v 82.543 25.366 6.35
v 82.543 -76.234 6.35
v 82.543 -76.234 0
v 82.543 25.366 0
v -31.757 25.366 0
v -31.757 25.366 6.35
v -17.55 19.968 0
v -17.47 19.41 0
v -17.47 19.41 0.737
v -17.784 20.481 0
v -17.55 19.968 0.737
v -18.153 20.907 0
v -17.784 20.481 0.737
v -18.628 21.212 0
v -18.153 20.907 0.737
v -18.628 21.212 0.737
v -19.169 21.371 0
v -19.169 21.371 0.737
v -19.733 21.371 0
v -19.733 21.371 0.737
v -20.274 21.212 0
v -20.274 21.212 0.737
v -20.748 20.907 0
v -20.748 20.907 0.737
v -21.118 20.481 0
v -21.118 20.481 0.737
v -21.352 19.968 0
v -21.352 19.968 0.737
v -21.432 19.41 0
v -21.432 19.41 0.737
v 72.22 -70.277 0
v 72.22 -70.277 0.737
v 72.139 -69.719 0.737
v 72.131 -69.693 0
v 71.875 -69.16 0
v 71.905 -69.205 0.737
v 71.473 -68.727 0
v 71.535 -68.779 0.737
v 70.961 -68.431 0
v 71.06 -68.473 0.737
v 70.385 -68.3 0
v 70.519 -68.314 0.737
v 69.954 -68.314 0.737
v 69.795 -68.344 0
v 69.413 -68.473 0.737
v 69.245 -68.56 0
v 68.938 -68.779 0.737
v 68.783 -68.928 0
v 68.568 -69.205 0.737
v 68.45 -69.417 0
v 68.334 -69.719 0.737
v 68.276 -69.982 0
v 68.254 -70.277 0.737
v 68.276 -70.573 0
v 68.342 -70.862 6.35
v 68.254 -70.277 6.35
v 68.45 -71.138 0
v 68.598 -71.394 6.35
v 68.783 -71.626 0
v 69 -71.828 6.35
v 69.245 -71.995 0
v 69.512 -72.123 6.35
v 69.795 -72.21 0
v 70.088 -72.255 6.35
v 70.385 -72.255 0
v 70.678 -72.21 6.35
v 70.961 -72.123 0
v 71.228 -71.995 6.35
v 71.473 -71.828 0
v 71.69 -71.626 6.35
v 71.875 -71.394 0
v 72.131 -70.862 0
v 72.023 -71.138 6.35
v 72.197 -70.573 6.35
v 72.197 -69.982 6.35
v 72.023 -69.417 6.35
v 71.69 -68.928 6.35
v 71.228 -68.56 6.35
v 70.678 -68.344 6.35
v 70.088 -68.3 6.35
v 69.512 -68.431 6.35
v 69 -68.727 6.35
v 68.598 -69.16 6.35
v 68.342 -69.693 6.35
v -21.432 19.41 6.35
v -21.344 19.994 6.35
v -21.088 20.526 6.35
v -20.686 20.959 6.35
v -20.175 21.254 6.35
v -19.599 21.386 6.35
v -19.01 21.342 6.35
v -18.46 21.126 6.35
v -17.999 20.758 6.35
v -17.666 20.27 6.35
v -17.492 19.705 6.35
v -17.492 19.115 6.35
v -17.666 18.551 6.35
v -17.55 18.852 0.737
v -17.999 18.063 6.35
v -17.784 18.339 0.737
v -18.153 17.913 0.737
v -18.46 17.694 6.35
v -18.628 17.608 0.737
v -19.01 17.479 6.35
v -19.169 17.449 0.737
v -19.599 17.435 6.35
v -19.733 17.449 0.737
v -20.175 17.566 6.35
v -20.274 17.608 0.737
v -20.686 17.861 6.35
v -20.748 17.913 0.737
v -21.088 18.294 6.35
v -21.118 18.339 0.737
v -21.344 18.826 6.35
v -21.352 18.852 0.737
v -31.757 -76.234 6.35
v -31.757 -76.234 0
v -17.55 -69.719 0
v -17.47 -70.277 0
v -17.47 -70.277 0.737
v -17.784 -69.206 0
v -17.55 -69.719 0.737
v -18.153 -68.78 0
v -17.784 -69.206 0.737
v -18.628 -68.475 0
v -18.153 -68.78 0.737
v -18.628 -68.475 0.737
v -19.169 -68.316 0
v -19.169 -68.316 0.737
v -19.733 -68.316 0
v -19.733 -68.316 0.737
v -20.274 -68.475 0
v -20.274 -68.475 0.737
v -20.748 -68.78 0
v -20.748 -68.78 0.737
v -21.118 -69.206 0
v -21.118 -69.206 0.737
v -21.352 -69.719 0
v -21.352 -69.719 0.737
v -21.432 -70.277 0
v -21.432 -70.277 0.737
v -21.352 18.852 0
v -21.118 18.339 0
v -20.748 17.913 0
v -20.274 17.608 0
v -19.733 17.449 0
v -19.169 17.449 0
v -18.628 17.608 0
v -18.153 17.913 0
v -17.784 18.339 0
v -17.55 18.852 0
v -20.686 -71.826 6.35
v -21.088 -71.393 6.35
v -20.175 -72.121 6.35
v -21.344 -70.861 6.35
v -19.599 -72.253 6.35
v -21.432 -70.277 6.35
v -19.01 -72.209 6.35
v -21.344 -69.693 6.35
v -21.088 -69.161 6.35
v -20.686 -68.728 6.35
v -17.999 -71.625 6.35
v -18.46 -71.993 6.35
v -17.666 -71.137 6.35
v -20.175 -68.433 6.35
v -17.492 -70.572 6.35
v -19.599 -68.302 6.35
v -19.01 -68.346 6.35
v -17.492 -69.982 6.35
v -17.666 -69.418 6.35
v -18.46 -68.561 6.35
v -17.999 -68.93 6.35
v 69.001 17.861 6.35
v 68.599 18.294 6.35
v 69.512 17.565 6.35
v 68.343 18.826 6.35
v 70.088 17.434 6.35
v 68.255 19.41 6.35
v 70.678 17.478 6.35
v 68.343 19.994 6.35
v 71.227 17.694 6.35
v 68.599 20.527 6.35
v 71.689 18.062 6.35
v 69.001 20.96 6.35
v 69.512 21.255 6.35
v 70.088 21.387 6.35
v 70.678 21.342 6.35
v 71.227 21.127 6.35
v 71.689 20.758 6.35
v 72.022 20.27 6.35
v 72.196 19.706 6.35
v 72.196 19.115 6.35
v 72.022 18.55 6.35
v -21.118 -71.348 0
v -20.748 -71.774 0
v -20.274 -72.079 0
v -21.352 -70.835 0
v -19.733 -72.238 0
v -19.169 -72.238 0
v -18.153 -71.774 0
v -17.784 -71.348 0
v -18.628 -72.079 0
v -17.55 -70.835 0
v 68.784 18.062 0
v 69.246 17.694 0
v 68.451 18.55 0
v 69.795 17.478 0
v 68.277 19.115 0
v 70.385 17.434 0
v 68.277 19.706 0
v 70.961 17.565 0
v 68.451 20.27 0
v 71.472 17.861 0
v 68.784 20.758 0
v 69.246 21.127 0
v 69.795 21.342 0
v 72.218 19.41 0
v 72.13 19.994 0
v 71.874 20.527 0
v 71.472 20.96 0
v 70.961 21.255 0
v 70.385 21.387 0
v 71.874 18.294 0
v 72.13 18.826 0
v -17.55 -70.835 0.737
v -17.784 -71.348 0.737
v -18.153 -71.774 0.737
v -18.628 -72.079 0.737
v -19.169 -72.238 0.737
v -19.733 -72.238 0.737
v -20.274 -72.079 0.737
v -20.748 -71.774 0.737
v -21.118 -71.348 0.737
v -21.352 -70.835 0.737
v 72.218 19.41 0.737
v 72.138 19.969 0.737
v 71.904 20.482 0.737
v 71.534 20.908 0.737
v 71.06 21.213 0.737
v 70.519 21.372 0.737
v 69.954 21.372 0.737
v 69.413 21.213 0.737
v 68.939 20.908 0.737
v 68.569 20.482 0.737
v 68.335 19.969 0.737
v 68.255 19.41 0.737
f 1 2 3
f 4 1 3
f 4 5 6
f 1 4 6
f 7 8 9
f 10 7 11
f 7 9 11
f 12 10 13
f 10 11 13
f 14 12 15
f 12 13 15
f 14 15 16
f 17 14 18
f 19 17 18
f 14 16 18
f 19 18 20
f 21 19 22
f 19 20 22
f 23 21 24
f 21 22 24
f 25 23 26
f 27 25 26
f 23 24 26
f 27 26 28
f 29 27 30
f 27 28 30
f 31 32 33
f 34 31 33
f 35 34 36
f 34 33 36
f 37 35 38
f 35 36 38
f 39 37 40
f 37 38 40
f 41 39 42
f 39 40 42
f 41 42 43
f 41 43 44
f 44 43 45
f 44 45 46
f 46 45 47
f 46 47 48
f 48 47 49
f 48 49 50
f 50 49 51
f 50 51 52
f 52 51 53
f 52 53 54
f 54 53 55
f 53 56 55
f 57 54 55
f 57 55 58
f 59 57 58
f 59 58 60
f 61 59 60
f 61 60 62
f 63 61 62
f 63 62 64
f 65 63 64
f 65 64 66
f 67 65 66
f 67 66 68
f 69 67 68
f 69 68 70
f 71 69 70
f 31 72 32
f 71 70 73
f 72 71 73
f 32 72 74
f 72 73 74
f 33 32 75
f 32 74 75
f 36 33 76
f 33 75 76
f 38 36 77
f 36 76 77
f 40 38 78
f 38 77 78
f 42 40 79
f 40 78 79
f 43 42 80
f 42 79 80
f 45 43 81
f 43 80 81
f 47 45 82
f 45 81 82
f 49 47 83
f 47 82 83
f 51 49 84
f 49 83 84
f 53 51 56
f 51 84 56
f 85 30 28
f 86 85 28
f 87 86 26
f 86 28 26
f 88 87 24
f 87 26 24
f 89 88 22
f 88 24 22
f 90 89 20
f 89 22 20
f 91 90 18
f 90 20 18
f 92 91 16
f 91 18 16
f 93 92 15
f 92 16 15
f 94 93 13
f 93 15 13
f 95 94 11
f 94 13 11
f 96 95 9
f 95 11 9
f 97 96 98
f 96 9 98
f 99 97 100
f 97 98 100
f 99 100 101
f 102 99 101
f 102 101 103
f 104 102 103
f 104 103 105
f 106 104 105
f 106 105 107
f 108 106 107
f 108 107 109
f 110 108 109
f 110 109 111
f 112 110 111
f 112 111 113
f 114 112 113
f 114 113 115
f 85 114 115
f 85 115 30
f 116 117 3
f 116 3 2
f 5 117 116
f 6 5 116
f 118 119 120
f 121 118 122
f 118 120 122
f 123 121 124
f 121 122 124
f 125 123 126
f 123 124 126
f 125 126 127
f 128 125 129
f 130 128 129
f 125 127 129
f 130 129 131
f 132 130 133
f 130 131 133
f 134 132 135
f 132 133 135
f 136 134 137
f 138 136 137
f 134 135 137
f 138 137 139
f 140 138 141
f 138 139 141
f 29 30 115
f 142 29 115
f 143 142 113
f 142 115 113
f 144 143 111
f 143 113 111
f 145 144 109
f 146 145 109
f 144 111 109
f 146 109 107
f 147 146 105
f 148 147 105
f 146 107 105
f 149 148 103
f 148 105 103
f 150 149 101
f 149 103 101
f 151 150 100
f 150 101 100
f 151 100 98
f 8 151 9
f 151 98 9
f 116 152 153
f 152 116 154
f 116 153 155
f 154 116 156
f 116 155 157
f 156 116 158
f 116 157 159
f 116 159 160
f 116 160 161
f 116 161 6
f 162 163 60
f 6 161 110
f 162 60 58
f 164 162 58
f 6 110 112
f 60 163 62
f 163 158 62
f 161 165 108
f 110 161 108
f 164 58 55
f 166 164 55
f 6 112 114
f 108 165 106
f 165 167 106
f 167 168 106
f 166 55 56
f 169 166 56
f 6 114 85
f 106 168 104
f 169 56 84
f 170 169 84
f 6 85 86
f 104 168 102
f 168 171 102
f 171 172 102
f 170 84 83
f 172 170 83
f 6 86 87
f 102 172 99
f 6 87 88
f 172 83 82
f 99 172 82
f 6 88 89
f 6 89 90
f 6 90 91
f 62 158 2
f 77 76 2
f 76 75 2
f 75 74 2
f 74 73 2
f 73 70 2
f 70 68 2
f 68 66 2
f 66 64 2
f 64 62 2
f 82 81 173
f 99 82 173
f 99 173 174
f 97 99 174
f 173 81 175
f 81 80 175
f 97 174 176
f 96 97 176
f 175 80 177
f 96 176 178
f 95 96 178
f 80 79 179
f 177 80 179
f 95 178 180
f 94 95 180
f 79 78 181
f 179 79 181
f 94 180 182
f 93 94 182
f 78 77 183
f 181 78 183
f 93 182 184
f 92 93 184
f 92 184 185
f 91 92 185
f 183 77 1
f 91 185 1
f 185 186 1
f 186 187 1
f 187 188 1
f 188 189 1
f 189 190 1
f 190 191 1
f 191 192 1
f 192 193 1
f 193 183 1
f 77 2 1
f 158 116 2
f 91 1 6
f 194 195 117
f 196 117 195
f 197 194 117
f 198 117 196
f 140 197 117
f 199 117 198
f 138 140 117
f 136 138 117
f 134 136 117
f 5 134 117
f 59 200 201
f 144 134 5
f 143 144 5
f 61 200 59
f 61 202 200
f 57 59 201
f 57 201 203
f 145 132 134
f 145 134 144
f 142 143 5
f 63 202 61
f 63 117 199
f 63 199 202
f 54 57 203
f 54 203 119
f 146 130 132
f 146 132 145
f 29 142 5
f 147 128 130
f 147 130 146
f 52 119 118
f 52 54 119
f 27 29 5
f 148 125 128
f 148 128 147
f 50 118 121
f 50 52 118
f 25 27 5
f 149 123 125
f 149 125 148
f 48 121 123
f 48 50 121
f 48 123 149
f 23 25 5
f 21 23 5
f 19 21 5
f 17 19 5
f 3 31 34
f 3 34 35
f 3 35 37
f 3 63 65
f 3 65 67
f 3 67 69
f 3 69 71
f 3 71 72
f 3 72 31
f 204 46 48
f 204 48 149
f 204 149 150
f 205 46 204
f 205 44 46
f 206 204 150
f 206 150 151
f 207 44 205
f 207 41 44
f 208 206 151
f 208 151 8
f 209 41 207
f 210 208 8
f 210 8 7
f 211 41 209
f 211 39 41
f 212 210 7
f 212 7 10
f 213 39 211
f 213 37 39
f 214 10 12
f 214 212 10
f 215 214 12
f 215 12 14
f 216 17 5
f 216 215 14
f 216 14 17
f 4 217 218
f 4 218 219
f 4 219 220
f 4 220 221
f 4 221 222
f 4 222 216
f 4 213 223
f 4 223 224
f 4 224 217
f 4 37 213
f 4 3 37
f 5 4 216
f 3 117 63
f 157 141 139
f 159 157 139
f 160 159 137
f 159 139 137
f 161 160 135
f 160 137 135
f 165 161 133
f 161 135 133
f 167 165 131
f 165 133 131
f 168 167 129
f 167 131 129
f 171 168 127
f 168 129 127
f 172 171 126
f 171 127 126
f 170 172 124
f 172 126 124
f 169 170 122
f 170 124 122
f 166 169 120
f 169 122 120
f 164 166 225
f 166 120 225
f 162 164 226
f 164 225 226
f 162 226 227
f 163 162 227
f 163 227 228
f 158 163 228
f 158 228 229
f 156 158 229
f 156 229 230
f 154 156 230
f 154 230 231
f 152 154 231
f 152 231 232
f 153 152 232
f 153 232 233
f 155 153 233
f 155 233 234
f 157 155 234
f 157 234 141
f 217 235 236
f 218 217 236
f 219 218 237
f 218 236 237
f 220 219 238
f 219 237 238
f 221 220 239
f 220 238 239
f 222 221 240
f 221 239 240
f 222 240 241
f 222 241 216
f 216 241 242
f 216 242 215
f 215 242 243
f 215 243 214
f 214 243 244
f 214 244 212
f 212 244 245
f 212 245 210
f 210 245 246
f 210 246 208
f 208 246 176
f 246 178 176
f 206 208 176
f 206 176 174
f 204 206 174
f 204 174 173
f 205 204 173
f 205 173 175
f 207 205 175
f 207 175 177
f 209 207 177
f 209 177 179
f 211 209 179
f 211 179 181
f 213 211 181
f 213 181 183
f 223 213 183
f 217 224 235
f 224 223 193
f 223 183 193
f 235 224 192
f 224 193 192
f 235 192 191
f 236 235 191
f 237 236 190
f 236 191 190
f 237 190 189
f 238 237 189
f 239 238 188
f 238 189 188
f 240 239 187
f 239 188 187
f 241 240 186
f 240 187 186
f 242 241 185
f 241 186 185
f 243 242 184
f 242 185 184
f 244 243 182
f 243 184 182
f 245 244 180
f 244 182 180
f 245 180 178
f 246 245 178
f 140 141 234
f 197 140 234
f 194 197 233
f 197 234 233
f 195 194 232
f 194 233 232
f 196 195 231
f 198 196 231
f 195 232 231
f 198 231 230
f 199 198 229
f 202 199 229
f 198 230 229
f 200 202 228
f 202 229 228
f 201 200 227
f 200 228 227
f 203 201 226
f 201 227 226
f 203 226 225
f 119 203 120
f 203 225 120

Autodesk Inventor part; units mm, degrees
ref_plane "YZ Plane" through (0, 0, 0) normal (1, 0, 0) x (0, 1, 0)
ref_plane "XZ Plane" through (0, 0, 0) normal (0, 1, 0) x (-1, 0, 0)
ref_plane "XY Plane" through (0, 0, 0) normal (0, 0, 1) x (1, 0, 0)
sketch "Sketch1" plane through (0, 0, 0) normal (0, 0, 1) x (1, 0, 0)
  line L0 (-25.4072, 25.3665) -> (76.1928, 25.3665)
  line L1 (76.1928, 25.3665) -> (76.1928, -76.2335)
  line L2 (76.1928, -76.2335) -> (-25.4072, -76.2335)
  line L3 (-25.4072, -76.2335) -> (-25.4072, 25.3665)
  point P0 (0, 0)
  dimension "d0" = 101.6
  dimension "d1" = 101.6
extrude "Extrusion1" add sketch "Sketch1" along normal blind 0.7366
sketch "Sketch2" plane through (0, 0, 0.7366) normal (0, 0, 1) x (1, 0, 0)
  line L0 (-25.4072, 25.3665) -> (76.1928, -76.2335)
  line L1 (76.1928, 25.3665) -> (-25.4072, -76.2335)
  circle A0 centre (25.3928, -25.4335) radius 27.432
  point P0 (0, 0)
  dimension "d4" = 54.864
extrude "Extrusion2" cut sketch "Sketch2" against normal blind 0.7366
sketch "Sketch3" plane through (0, 0, 0.7366) normal (0, 0, 1) x (1, 0, 0)
  line L0 (-25.4072, -76.2335) -> (-25.4072, 25.3665) projected
  line L1 (-25.4072, 25.3665) -> (-25.4072, -25.4335)
  line L2 (-25.4072, -25.4335) -> (-25.4072, 19.4102)
  line L3 (-25.4072, 25.3665) -> (76.1928, -76.2335)
  line L4 (76.1928, 25.3665) -> (-25.4072, -76.2335)
  circle A0 centre (-19.4509, 19.4102) radius 1.9812
  point P0 (0, 0)
  dimension "d7" = 44.8437
  dimension "d8" = 3.9624
extrude "Extrusion3" cut sketch "Sketch3" against normal blind 0.7366 contours A0 L3 | L3 A0
sketch "Sketch4" plane through (0, 0, 0.7366) normal (0, 0, 1) x (1, 0, 0)
  line L0 (-25.4072, -76.2335) -> (76.1928, 25.3665)
  line L1 (-25.4072, 25.3665) -> (76.1928, -76.2335)
  circle A0 centre (70.2365, 19.4102) radius 1.9819
  circle A1 centre (70.2365, -70.2772) radius 1.983
  circle A2 centre (-19.4509, -70.2772) radius 1.9812
  point P0 (0, 0)
extrude "Extrusion4" cut sketch "Sketch4" against normal blind 0.7366
sketch "Sketch5" plane through (0, 0, 0.7366) normal (0, 0, 1) x (1, 0, 0)
  circle A0 centre (25.3928, -25.4335) radius 27.432 projected
  circle A1 centre (25.3928, -25.4335) radius 29.972
  circle A2 centre (25.3928, -25.4335) radius 32.512
  point P0 (0, 0)
  dimension "d13" = 59.944
  dimension "d14" = 65.024
extrude "Extrusion5" add sketch "Sketch5" along normal blind 6.6548 contours A2
fillet "Fillet1" radius 3.175 4 edges at (-25.4072, 25.3665, 0.3683) (76.1928, 25.3665, 0.3683) (76.1928, -76.2335, 0.3683) (-25.4072, -76.2335, 0.3683)
sketch "Sketch6" plane through (0, 0, 0) normal (0, 0, -1) x (-1, 0, 0)
  circle A0 centre (-70.2365, 19.4102) radius 1.9819 projected
  circle A1 centre (19.4509, -70.2772) radius 1.9812 projected
  circle A2 centre (-70.2365, -70.2772) radius 1.983 projected
  circle A3 centre (19.4509, 19.4102) radius 1.9812 projected
  line L0 (-76.1928, 25.3665) -> (25.4072, 25.3665)
  line L1 (25.4072, 25.3665) -> (25.4072, -76.2335)
  line L2 (25.4072, -76.2335) -> (-76.1928, -76.2335)
  line L3 (-76.1928, -76.2335) -> (-76.1928, 25.3665)
  point P0 (0, 0)
extrude "Extrusion6" add sketch "Sketch6" against normal blind 6.35
sketch "Sketch7" plane through (0, 0, 6.35) normal (0, 0, 1) x (1, 0, 0)
  line L0 (-14.3145, 13.5707) -> (65.0173, 13.5707)
  line L1 (65.0173, 13.5707) -> (65.0173, -65.16)
  line L2 (65.0173, -65.16) -> (-14.3145, -65.16)
  line L3 (-14.3145, -65.16) -> (-14.3145, 13.5707)
  point P0 (0, 0)
extrude "Extrusion7" cut sketch "Sketch7" along normal blind 6.35
sketch "Sketch8" plane through (0, 0, 6.35) normal (0, 0, 1) x (1, 0, 0)
  circle A0 centre (70.2365, -70.2772) radius 1.983 projected
  circle A1 centre (-19.4509, 19.4102) radius 1.9812 projected
  line L0 (-19.4509, 19.4102) -> (70.2365, 19.4102)
  line L1 (70.2365, 19.4102) -> (70.2365, -70.2772)
  line L2 (70.2365, -70.2772) -> (-19.4509, -70.2772)
  line L3 (-19.4509, -70.2772) -> (-19.4509, 19.4102)
  line L4 (63.8865, 13.0602) -> (-13.1009, 13.0602)
  line L5 (-13.1009, 13.0602) -> (-13.1009, -63.9272)
  line L6 (-13.1009, -63.9272) -> (63.8865, -63.9272)
  line L7 (63.8865, -63.9272) -> (63.8865, 13.0602)
  line L8 (-13.1009, -25.4335) -> (-13.1009, -19.0835)
  line L9 (-13.1009, -19.0835) -> (63.8865, -19.0835)
  line L10 (63.8865, -19.0835) -> (63.8865, -31.7835)
  line L11 (63.8865, -31.7835) -> (-13.1009, -31.7835)
  point P0 (0, 0)
  dimension "d22" = 6.35
  dimension "d23" = 6.35
  dimension "d24" = 12.7
extrude "Extrusion8" cut sketch "Sketch8" against normal blind 25.4 contours L7 L9 L5 L4 | L7 L6 L5 L11
sketch "Sketch9" plane through (0, 0, 6.35) normal (0, 0, 1) x (1, 0, 0)
  line L0 (63.8865, -63.9272) -> (-13.1009, -63.9272) projected
  line L1 (-13.1009, 13.0602) -> (63.8865, 13.0602) projected
  line L2 (-25.4072, 25.3665) -> (76.1928, 25.3665) projected
  line L3 (76.1928, -76.2335) -> (-25.4072, -76.2335) projected
  line L4 (-13.1009, 13.0602) -> (-13.1009, 25.3665)
  line L5 (63.8865, 13.0602) -> (63.8865, 25.3665)
  line L6 (63.8865, -63.9272) -> (63.8865, -76.2335)
  line L7 (-13.1009, -63.9272) -> (-13.1009, -76.2335)
  point P0 (0, 0)
extrude "Extrusion9" cut sketch "Sketch9" against normal blind 25.4
sketch "Sketch10" plane through (0, 0, 6.35) normal (0, 0, 1) x (1, 0, 0)
  line L0 (-13.1009, 25.3665) -> (63.8865, 25.3665)
  line L1 (63.8865, 25.3665) -> (63.8865, -76.2335)
  line L2 (63.8865, -76.2335) -> (-13.1009, -76.2335)
  line L3 (-13.1009, -76.2335) -> (-13.1009, 25.3665)
  point P0 (0, 0)
extrude "Extrusion10" add sketch "Sketch10" against normal blind 6.35
sketch "Sketch11" plane through (76.1928, -76.2335, 0) normal (1, 0, 0) x (0, 0, -1)
  line L0 (0, 101.6) -> (0, 0) projected
  line L1 (0, 101.6) -> (-6.35, 101.6) projected
  line L2 (-6.35, 101.6) -> (-6.35, 0) projected
  line L3 (0, 0) -> (-6.35, 0) projected
  point P0 (0, 76.2335)
extrude "Extrusion11" add sketch "Sketch11" along normal blind 6.35
sketch "Sketch12" plane through (-25.4072, -76.2335, 0) normal (-1, 0, 0) x (0, 0, 1)
  line L0 (0, 0) -> (0, 101.6) projected
  line L1 (0, 0) -> (6.35, 0) projected
  line L2 (6.35, 0) -> (6.35, 101.6) projected
  line L3 (0, 101.6) -> (6.35, 101.6) projected
  point P0 (0, 76.2335)
extrude "Extrusion12" add sketch "Sketch12" along normal blind 6.35
properties part number "tb2"
